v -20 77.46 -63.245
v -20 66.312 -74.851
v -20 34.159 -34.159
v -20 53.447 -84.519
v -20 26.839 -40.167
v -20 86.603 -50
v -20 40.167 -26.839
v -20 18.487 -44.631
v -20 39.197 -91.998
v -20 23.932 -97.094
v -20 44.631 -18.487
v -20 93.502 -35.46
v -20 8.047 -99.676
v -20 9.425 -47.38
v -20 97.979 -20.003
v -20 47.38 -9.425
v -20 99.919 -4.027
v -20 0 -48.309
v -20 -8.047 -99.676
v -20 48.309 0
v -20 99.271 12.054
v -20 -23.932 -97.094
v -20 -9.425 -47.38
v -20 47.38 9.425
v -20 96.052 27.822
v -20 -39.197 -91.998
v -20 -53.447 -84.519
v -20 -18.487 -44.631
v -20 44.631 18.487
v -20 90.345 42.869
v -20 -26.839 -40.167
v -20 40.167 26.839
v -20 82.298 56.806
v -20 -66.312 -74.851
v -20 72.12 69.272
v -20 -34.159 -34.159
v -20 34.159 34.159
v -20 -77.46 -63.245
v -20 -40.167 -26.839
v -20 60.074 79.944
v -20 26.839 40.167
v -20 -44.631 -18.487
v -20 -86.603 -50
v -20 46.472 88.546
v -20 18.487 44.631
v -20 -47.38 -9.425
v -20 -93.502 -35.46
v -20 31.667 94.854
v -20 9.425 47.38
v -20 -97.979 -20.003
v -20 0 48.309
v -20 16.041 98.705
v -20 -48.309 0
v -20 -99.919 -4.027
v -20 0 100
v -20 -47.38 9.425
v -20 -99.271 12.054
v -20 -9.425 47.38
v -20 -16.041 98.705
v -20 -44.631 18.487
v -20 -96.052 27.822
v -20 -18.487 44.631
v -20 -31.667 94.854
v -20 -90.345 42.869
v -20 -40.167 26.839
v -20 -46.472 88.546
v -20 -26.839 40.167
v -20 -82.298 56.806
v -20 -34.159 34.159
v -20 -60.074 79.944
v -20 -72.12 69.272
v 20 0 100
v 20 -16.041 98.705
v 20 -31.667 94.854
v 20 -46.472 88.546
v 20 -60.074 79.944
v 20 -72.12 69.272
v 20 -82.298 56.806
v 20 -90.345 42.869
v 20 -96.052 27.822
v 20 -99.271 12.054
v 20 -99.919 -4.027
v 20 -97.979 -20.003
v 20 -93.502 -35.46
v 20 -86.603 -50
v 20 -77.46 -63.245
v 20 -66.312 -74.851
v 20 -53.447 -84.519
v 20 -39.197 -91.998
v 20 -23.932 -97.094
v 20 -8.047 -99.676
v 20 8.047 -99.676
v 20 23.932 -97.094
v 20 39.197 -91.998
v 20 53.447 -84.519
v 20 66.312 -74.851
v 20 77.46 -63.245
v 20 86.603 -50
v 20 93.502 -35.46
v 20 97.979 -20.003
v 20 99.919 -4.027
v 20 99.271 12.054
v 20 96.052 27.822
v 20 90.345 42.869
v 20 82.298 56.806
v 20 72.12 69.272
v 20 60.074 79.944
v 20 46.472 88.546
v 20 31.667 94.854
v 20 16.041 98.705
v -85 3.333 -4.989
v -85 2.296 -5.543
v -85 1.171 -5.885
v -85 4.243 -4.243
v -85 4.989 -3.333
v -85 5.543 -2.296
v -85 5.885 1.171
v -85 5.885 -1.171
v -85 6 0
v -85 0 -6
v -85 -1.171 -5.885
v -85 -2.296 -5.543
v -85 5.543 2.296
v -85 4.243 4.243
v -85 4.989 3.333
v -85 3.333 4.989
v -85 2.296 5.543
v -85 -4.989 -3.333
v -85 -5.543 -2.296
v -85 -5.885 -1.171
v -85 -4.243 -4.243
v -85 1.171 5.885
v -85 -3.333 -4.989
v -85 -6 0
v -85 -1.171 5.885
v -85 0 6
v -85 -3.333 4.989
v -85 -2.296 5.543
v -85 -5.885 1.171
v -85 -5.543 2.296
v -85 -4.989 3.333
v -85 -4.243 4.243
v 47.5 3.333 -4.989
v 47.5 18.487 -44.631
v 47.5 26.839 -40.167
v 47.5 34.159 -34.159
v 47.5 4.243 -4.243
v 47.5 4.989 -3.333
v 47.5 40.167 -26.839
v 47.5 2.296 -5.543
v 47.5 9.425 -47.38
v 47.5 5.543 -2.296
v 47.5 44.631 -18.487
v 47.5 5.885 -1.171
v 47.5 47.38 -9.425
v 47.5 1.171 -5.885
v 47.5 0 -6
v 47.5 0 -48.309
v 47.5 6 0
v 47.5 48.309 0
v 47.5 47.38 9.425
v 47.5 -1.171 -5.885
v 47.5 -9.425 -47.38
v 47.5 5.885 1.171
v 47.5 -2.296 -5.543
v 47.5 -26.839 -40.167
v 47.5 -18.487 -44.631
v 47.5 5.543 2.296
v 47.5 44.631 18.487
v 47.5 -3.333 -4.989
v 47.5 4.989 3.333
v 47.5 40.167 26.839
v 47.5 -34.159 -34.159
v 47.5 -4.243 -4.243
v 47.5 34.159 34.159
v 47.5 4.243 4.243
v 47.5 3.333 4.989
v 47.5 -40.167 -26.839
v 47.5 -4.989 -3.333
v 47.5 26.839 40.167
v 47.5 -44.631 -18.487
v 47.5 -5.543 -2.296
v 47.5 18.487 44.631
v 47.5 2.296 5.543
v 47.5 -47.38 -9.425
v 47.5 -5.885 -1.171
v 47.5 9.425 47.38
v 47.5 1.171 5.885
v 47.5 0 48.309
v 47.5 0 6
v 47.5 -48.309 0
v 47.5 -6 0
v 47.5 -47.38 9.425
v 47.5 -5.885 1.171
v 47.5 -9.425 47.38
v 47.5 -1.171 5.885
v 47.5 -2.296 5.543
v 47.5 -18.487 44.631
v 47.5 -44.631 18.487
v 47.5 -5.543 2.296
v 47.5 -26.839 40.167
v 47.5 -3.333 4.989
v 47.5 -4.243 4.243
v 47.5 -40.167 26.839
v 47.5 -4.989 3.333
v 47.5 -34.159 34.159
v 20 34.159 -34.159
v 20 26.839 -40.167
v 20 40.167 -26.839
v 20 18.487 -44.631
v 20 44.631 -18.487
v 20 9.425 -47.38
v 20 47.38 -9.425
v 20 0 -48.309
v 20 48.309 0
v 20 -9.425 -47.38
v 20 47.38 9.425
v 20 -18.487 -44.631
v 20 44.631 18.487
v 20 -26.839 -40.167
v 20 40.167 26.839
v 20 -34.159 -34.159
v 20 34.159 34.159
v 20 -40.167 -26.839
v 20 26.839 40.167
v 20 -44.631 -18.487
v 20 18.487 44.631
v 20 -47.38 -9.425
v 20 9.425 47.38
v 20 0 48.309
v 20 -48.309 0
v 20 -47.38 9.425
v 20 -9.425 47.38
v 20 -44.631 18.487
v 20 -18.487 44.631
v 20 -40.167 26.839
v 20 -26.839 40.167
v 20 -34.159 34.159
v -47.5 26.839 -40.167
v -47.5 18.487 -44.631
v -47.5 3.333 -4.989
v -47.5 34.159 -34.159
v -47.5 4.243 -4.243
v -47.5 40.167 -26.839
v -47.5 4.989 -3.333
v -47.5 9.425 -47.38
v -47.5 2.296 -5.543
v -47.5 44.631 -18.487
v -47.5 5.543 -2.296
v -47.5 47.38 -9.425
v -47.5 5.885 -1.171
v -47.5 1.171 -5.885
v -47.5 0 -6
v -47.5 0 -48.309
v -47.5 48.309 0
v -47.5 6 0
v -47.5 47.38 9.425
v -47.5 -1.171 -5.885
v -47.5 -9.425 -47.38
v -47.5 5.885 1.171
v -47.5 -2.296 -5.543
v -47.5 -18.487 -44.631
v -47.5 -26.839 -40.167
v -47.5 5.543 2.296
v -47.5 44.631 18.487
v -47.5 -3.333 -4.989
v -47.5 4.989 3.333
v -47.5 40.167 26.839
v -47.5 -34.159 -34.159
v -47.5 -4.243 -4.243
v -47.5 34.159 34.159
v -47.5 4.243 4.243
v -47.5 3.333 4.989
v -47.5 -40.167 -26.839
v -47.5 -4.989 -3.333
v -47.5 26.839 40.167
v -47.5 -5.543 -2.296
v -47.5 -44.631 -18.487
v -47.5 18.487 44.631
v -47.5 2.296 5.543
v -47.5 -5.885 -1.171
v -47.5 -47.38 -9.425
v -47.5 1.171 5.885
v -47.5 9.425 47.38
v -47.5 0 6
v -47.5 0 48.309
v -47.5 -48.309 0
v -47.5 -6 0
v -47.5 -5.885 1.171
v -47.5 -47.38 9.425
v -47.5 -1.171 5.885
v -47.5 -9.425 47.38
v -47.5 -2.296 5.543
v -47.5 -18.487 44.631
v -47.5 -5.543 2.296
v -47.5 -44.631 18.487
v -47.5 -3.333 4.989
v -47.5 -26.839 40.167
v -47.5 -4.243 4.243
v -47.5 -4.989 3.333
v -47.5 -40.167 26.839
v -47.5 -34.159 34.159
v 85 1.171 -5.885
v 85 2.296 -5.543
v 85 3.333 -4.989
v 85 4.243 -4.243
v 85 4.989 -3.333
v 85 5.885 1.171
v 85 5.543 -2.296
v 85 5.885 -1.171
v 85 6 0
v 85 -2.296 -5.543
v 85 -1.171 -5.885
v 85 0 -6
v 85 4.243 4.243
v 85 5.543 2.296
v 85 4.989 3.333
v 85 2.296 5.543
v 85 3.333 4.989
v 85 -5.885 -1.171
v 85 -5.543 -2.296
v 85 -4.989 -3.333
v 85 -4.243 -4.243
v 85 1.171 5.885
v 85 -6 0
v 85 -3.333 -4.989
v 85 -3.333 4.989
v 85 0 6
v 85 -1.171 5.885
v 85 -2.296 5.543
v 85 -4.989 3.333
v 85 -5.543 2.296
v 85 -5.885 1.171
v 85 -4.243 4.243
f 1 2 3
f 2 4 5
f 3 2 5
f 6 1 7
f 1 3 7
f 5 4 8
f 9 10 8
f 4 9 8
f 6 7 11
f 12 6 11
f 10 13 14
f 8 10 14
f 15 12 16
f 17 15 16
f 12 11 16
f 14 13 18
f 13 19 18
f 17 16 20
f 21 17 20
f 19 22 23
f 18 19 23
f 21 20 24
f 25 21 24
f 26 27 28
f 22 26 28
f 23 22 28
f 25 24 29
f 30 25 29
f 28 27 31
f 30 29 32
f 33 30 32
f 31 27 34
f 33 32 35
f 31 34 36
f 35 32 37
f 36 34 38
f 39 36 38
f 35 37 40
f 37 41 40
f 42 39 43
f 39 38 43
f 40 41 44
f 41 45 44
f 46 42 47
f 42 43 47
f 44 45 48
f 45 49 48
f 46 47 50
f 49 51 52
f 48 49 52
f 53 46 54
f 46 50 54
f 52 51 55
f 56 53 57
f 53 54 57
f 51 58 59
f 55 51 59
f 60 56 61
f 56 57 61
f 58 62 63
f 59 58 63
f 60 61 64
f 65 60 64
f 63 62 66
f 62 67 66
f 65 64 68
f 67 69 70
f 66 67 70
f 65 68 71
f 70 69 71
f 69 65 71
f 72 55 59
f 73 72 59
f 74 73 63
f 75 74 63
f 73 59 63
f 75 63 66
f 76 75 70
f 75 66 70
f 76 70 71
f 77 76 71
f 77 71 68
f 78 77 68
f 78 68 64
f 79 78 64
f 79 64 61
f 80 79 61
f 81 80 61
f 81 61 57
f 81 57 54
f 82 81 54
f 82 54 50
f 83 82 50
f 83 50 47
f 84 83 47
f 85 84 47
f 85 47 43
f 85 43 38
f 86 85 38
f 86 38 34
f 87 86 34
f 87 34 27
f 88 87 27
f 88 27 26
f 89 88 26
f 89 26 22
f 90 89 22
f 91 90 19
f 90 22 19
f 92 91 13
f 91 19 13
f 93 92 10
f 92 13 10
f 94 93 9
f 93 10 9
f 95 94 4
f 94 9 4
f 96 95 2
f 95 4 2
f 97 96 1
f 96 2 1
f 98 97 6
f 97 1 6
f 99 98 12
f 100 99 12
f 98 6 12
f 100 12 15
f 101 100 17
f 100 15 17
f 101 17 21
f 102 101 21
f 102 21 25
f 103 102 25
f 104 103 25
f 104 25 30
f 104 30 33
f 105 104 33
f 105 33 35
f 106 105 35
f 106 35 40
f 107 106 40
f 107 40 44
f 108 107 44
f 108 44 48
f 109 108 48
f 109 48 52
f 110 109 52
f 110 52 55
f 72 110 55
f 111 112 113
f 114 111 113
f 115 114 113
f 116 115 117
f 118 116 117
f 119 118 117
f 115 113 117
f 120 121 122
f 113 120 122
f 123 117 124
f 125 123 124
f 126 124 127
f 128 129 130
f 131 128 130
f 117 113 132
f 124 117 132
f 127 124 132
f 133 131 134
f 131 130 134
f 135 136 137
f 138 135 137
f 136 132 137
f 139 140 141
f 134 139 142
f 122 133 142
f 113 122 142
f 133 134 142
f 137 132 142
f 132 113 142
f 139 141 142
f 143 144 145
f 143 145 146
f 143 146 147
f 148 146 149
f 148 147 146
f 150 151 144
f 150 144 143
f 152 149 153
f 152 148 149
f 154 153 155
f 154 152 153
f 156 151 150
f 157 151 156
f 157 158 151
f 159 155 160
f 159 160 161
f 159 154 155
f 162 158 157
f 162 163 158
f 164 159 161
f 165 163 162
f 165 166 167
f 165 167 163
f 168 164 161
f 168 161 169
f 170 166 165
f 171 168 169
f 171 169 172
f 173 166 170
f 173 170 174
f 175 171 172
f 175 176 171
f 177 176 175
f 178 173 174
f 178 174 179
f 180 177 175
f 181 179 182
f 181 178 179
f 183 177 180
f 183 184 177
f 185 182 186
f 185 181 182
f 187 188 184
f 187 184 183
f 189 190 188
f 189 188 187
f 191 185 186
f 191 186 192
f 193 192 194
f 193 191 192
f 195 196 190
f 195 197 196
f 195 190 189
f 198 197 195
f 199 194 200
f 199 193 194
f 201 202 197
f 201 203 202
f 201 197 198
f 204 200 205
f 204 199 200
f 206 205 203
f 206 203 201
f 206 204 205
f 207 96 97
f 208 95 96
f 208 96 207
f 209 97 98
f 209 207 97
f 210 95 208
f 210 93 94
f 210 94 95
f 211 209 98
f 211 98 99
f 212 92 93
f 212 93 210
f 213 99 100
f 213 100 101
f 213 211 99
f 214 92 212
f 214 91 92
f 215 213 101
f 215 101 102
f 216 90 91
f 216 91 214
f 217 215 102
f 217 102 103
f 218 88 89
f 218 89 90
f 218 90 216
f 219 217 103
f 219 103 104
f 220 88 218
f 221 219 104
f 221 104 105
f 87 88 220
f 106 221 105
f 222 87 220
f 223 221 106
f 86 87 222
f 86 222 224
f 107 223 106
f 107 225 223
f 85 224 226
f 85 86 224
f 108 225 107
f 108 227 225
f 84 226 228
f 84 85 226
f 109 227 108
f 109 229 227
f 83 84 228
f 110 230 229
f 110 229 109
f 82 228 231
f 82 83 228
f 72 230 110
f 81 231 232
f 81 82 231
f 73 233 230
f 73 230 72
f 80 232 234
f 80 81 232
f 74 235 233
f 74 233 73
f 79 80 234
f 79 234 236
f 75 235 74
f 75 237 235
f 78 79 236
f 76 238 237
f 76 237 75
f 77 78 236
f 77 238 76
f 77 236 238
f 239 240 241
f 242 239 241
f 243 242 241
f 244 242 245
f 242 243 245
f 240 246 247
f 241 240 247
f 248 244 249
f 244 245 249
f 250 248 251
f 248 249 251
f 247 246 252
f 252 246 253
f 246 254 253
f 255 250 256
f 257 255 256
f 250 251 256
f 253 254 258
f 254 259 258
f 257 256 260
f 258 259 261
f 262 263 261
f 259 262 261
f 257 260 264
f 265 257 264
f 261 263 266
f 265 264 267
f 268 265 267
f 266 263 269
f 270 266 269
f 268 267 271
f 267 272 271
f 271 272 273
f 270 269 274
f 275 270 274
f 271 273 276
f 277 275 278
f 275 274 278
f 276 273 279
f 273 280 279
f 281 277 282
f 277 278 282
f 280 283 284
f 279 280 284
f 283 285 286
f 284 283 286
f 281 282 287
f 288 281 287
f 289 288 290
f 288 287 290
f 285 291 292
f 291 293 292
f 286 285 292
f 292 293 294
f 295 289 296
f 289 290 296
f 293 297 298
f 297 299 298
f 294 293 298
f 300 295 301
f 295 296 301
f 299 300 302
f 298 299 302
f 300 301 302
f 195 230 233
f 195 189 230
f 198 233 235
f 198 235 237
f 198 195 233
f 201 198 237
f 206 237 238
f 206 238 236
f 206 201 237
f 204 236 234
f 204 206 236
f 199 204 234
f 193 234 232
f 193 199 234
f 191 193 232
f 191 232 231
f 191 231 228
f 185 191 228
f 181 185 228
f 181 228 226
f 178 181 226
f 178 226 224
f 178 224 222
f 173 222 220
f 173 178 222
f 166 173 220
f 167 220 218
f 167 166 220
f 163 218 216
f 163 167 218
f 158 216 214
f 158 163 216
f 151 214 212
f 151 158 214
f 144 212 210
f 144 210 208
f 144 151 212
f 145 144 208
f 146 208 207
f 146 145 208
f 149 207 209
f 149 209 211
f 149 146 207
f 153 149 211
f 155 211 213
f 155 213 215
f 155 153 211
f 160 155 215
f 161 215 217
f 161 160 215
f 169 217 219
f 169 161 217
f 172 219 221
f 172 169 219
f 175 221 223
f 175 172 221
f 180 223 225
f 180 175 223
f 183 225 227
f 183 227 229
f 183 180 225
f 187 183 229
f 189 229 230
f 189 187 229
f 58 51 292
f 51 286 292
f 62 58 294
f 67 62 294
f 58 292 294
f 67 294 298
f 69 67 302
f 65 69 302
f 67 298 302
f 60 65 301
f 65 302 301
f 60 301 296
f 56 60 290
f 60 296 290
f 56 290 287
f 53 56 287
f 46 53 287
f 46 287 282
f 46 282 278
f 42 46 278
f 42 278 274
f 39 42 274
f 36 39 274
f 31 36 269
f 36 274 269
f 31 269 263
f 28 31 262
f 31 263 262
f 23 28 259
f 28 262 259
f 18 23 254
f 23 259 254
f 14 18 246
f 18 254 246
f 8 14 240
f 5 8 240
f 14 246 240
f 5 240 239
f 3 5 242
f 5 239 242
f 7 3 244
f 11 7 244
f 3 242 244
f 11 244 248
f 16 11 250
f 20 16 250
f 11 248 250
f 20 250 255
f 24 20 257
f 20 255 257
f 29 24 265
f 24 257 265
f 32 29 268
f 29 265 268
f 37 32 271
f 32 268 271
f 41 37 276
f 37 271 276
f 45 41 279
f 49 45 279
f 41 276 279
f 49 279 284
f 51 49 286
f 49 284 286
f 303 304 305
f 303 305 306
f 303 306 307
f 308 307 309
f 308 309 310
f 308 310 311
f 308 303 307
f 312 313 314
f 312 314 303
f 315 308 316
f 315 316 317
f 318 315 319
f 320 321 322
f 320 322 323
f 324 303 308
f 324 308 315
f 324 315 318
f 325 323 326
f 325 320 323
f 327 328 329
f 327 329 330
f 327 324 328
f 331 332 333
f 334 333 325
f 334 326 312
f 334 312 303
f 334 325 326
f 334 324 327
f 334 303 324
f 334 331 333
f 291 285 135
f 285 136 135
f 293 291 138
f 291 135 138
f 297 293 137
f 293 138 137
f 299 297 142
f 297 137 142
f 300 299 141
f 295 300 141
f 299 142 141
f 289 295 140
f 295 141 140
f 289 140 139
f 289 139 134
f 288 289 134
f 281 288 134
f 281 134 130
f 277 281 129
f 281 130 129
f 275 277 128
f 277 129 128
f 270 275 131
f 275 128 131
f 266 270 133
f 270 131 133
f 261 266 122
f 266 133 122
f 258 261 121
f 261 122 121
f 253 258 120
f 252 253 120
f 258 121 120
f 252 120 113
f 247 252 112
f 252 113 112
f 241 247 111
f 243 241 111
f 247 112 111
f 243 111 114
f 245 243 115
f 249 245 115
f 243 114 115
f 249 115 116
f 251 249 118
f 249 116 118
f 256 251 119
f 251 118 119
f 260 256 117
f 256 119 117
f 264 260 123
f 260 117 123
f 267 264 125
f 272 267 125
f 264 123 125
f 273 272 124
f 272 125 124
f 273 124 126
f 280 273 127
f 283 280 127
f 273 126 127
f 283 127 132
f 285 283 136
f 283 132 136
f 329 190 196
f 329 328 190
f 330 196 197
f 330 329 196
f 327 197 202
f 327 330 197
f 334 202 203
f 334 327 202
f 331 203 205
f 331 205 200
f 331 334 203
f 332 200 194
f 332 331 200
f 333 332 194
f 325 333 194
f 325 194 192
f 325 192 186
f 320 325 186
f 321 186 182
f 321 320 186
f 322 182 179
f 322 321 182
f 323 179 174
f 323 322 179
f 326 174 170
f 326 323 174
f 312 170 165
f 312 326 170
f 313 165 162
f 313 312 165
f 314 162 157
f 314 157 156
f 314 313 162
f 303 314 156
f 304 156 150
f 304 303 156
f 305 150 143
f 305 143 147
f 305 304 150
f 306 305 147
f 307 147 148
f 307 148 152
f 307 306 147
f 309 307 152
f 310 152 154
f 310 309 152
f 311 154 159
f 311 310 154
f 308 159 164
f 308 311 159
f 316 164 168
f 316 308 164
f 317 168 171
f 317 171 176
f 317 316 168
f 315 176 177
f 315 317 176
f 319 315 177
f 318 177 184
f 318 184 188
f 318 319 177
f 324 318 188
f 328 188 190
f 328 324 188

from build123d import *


with BuildPart() as part:
    # 草图1 → 旋转1 (revolve)
    with BuildSketch(Plane.XY, mode=Mode.PRIVATE) as revolve_1_sk:
        Polygon((0, 0), (0, 100), (20, 100), (20, 48.308684326), (47.5, 48.308684326), (47.5, 6), (85, 6), (85, 0), align=None)
    revolve_1 = revolve(revolve_1_sk.sketch.rotate(Axis((-1219.943710548, 0, 0), (1, 0, 0)), 90), axis=Axis((-1219.943710548, 0, 0), (1, 0, 0)))

    # 镜向1: 旋转1 across plane
    add(revolve_1.mirror(Plane(origin=(0, 0, 0), x_dir=(0, 0, 1), z_dir=(1, 0, 0))))


solid = part.part
